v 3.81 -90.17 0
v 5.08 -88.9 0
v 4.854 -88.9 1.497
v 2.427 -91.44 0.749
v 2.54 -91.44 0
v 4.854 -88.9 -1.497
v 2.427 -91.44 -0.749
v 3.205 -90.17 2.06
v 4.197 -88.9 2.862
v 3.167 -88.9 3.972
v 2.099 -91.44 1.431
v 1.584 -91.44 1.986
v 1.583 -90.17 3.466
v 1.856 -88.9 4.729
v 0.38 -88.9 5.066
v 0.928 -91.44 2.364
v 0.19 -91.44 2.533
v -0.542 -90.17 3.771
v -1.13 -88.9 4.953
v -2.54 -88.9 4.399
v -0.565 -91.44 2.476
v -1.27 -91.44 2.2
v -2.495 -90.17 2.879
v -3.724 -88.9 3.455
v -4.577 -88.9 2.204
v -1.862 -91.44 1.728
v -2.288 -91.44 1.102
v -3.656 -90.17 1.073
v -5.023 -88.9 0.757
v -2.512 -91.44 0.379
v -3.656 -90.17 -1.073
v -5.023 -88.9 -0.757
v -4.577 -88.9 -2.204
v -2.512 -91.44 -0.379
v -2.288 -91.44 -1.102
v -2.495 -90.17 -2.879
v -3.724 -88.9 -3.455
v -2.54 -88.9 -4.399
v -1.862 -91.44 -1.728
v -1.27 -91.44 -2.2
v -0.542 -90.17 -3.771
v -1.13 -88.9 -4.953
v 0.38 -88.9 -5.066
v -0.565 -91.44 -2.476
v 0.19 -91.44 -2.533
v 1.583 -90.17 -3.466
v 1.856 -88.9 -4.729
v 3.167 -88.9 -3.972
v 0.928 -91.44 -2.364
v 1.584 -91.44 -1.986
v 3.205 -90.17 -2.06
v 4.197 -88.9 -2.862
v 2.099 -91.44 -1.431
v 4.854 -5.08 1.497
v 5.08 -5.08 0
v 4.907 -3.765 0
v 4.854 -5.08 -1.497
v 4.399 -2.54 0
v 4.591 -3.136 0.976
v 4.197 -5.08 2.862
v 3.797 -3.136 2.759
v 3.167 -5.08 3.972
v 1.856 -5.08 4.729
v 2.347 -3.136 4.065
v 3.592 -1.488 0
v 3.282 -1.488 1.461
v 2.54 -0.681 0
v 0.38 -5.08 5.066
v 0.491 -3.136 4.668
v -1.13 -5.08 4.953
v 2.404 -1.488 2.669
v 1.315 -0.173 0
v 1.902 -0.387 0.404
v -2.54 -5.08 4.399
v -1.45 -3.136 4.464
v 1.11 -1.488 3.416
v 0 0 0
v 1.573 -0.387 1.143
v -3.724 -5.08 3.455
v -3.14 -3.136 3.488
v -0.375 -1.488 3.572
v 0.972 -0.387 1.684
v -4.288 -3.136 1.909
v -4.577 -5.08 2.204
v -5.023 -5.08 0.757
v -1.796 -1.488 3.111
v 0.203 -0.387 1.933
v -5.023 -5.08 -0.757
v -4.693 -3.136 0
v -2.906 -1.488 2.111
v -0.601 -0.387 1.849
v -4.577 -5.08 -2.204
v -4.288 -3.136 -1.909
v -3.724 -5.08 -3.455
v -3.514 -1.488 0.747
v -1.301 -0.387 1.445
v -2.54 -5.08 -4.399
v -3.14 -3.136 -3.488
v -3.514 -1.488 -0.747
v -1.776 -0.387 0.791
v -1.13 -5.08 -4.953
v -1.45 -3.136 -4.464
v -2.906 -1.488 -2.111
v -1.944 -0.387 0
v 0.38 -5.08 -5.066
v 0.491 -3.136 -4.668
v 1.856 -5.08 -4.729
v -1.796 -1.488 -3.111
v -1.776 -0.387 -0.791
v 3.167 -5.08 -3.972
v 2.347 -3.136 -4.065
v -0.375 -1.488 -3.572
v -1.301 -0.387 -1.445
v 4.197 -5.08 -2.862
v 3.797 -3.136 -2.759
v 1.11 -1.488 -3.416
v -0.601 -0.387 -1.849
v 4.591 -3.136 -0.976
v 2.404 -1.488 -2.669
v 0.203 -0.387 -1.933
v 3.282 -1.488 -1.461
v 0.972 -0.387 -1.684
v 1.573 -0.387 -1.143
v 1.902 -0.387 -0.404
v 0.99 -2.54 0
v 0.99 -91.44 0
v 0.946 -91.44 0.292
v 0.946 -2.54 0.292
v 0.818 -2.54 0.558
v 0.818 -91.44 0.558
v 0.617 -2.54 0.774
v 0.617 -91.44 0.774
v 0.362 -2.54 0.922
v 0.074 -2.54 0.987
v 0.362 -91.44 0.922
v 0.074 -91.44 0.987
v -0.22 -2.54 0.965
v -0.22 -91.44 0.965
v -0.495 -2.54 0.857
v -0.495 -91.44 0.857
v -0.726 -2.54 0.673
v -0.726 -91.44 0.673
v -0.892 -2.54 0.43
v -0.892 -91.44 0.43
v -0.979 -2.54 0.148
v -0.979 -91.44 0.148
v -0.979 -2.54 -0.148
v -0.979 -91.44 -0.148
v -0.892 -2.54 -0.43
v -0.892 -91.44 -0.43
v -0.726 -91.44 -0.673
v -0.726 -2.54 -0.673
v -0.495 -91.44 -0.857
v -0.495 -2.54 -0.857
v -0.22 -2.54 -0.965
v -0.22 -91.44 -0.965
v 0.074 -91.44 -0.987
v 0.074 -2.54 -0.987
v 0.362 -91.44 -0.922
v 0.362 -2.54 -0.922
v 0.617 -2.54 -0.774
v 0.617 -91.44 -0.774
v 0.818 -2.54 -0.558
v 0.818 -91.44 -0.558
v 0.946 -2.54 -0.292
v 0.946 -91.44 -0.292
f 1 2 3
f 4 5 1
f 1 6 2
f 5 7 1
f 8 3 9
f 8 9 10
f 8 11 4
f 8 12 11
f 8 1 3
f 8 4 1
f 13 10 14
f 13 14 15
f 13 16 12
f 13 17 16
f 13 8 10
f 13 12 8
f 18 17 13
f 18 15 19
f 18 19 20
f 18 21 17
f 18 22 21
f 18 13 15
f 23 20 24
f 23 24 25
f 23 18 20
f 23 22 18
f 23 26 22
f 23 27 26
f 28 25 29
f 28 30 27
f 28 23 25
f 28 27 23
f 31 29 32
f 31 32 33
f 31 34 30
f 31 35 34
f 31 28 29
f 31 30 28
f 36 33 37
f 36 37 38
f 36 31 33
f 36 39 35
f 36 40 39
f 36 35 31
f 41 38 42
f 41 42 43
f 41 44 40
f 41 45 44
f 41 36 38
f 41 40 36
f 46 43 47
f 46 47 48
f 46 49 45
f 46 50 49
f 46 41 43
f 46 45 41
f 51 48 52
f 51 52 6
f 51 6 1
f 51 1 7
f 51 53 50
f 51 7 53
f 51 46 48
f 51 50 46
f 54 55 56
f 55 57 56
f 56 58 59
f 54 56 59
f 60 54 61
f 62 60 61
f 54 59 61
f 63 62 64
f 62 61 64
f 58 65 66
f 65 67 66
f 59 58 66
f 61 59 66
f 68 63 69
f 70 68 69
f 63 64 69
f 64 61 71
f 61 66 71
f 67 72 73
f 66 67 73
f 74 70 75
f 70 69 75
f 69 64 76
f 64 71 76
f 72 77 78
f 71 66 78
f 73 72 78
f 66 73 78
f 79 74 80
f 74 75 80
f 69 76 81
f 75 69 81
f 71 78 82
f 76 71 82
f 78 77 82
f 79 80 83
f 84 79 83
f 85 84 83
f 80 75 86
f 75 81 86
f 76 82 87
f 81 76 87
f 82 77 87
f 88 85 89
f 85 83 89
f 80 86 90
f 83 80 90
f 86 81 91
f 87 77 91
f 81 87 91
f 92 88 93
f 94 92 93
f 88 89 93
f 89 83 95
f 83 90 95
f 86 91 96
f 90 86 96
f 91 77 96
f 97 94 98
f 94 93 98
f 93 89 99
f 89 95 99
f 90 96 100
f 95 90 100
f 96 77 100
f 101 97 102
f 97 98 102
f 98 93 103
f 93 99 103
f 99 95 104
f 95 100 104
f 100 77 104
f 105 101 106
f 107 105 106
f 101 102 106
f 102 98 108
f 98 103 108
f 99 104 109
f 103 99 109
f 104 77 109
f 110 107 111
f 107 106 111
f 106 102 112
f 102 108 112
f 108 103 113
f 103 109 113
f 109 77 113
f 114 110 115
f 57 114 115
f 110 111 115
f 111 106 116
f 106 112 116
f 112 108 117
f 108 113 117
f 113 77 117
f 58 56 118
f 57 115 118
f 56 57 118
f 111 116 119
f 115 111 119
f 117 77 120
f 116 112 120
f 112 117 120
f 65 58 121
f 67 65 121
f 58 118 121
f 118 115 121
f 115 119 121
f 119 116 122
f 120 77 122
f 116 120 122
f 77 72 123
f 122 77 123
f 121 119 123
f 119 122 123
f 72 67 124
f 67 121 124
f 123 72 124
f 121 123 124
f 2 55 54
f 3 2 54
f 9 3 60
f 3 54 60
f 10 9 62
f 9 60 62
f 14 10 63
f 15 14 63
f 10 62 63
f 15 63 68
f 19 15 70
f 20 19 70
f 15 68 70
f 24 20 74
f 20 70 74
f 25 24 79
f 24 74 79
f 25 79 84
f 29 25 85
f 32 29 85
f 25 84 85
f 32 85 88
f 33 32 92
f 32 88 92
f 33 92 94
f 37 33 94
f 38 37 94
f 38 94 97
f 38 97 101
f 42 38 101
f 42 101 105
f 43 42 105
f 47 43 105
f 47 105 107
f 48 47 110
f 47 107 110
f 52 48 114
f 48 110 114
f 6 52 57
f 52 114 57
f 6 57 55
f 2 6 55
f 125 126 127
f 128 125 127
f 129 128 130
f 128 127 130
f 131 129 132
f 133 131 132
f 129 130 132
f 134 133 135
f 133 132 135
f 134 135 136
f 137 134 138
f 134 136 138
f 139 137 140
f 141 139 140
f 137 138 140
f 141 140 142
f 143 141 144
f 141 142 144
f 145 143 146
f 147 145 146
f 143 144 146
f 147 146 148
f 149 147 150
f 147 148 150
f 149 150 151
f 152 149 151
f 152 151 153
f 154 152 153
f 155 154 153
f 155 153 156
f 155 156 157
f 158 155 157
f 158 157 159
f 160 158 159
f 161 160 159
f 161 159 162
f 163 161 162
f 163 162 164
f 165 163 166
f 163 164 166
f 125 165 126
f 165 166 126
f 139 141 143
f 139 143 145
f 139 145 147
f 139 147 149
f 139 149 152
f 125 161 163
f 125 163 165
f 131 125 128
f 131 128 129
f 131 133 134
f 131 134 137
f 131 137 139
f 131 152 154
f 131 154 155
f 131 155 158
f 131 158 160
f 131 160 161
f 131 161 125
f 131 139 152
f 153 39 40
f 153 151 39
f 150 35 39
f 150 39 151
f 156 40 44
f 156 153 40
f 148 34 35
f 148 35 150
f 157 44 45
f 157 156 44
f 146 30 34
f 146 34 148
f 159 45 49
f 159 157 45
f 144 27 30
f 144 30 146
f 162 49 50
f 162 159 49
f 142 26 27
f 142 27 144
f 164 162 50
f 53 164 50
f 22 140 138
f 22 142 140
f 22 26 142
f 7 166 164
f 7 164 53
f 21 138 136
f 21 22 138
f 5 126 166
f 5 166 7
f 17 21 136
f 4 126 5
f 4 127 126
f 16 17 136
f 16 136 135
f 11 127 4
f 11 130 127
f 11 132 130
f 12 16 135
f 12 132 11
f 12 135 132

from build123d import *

# Parameters (mm, degrees)
F0_R     = 5.08
F1_DEPTH = 91.44
F2_R     = 0.99
F3_DEPTH = 88.9
F4_SIZE  = 2.54
F5_R     = 5.08


with BuildPart() as f1:
    # F0 (on Front) → F1 (new body)
    with BuildSketch(Plane.XZ):
        Circle(F0_R)
    extrude(amount=F1_DEPTH)

    # F2 (on face) → F3 (cut)
    with BuildSketch(Plane.XZ.offset(91.44)):
        Circle(F2_R)
    extrude(amount=-F3_DEPTH, mode=Mode.SUBTRACT)

    # F4
    f4_edges = [f1.edges().sort_by_distance(p)[0] for p in [
        (-5.08, -91.44, 0),
    ]]
    chamfer(f4_edges, length=F4_SIZE)

    # F5
    f5_edges = [f1.edges().sort_by_distance(p)[0] for p in [
        (-5.08, 0, 0),
    ]]
    fillet(f5_edges, radius=F5_R)


solid = f1.part
